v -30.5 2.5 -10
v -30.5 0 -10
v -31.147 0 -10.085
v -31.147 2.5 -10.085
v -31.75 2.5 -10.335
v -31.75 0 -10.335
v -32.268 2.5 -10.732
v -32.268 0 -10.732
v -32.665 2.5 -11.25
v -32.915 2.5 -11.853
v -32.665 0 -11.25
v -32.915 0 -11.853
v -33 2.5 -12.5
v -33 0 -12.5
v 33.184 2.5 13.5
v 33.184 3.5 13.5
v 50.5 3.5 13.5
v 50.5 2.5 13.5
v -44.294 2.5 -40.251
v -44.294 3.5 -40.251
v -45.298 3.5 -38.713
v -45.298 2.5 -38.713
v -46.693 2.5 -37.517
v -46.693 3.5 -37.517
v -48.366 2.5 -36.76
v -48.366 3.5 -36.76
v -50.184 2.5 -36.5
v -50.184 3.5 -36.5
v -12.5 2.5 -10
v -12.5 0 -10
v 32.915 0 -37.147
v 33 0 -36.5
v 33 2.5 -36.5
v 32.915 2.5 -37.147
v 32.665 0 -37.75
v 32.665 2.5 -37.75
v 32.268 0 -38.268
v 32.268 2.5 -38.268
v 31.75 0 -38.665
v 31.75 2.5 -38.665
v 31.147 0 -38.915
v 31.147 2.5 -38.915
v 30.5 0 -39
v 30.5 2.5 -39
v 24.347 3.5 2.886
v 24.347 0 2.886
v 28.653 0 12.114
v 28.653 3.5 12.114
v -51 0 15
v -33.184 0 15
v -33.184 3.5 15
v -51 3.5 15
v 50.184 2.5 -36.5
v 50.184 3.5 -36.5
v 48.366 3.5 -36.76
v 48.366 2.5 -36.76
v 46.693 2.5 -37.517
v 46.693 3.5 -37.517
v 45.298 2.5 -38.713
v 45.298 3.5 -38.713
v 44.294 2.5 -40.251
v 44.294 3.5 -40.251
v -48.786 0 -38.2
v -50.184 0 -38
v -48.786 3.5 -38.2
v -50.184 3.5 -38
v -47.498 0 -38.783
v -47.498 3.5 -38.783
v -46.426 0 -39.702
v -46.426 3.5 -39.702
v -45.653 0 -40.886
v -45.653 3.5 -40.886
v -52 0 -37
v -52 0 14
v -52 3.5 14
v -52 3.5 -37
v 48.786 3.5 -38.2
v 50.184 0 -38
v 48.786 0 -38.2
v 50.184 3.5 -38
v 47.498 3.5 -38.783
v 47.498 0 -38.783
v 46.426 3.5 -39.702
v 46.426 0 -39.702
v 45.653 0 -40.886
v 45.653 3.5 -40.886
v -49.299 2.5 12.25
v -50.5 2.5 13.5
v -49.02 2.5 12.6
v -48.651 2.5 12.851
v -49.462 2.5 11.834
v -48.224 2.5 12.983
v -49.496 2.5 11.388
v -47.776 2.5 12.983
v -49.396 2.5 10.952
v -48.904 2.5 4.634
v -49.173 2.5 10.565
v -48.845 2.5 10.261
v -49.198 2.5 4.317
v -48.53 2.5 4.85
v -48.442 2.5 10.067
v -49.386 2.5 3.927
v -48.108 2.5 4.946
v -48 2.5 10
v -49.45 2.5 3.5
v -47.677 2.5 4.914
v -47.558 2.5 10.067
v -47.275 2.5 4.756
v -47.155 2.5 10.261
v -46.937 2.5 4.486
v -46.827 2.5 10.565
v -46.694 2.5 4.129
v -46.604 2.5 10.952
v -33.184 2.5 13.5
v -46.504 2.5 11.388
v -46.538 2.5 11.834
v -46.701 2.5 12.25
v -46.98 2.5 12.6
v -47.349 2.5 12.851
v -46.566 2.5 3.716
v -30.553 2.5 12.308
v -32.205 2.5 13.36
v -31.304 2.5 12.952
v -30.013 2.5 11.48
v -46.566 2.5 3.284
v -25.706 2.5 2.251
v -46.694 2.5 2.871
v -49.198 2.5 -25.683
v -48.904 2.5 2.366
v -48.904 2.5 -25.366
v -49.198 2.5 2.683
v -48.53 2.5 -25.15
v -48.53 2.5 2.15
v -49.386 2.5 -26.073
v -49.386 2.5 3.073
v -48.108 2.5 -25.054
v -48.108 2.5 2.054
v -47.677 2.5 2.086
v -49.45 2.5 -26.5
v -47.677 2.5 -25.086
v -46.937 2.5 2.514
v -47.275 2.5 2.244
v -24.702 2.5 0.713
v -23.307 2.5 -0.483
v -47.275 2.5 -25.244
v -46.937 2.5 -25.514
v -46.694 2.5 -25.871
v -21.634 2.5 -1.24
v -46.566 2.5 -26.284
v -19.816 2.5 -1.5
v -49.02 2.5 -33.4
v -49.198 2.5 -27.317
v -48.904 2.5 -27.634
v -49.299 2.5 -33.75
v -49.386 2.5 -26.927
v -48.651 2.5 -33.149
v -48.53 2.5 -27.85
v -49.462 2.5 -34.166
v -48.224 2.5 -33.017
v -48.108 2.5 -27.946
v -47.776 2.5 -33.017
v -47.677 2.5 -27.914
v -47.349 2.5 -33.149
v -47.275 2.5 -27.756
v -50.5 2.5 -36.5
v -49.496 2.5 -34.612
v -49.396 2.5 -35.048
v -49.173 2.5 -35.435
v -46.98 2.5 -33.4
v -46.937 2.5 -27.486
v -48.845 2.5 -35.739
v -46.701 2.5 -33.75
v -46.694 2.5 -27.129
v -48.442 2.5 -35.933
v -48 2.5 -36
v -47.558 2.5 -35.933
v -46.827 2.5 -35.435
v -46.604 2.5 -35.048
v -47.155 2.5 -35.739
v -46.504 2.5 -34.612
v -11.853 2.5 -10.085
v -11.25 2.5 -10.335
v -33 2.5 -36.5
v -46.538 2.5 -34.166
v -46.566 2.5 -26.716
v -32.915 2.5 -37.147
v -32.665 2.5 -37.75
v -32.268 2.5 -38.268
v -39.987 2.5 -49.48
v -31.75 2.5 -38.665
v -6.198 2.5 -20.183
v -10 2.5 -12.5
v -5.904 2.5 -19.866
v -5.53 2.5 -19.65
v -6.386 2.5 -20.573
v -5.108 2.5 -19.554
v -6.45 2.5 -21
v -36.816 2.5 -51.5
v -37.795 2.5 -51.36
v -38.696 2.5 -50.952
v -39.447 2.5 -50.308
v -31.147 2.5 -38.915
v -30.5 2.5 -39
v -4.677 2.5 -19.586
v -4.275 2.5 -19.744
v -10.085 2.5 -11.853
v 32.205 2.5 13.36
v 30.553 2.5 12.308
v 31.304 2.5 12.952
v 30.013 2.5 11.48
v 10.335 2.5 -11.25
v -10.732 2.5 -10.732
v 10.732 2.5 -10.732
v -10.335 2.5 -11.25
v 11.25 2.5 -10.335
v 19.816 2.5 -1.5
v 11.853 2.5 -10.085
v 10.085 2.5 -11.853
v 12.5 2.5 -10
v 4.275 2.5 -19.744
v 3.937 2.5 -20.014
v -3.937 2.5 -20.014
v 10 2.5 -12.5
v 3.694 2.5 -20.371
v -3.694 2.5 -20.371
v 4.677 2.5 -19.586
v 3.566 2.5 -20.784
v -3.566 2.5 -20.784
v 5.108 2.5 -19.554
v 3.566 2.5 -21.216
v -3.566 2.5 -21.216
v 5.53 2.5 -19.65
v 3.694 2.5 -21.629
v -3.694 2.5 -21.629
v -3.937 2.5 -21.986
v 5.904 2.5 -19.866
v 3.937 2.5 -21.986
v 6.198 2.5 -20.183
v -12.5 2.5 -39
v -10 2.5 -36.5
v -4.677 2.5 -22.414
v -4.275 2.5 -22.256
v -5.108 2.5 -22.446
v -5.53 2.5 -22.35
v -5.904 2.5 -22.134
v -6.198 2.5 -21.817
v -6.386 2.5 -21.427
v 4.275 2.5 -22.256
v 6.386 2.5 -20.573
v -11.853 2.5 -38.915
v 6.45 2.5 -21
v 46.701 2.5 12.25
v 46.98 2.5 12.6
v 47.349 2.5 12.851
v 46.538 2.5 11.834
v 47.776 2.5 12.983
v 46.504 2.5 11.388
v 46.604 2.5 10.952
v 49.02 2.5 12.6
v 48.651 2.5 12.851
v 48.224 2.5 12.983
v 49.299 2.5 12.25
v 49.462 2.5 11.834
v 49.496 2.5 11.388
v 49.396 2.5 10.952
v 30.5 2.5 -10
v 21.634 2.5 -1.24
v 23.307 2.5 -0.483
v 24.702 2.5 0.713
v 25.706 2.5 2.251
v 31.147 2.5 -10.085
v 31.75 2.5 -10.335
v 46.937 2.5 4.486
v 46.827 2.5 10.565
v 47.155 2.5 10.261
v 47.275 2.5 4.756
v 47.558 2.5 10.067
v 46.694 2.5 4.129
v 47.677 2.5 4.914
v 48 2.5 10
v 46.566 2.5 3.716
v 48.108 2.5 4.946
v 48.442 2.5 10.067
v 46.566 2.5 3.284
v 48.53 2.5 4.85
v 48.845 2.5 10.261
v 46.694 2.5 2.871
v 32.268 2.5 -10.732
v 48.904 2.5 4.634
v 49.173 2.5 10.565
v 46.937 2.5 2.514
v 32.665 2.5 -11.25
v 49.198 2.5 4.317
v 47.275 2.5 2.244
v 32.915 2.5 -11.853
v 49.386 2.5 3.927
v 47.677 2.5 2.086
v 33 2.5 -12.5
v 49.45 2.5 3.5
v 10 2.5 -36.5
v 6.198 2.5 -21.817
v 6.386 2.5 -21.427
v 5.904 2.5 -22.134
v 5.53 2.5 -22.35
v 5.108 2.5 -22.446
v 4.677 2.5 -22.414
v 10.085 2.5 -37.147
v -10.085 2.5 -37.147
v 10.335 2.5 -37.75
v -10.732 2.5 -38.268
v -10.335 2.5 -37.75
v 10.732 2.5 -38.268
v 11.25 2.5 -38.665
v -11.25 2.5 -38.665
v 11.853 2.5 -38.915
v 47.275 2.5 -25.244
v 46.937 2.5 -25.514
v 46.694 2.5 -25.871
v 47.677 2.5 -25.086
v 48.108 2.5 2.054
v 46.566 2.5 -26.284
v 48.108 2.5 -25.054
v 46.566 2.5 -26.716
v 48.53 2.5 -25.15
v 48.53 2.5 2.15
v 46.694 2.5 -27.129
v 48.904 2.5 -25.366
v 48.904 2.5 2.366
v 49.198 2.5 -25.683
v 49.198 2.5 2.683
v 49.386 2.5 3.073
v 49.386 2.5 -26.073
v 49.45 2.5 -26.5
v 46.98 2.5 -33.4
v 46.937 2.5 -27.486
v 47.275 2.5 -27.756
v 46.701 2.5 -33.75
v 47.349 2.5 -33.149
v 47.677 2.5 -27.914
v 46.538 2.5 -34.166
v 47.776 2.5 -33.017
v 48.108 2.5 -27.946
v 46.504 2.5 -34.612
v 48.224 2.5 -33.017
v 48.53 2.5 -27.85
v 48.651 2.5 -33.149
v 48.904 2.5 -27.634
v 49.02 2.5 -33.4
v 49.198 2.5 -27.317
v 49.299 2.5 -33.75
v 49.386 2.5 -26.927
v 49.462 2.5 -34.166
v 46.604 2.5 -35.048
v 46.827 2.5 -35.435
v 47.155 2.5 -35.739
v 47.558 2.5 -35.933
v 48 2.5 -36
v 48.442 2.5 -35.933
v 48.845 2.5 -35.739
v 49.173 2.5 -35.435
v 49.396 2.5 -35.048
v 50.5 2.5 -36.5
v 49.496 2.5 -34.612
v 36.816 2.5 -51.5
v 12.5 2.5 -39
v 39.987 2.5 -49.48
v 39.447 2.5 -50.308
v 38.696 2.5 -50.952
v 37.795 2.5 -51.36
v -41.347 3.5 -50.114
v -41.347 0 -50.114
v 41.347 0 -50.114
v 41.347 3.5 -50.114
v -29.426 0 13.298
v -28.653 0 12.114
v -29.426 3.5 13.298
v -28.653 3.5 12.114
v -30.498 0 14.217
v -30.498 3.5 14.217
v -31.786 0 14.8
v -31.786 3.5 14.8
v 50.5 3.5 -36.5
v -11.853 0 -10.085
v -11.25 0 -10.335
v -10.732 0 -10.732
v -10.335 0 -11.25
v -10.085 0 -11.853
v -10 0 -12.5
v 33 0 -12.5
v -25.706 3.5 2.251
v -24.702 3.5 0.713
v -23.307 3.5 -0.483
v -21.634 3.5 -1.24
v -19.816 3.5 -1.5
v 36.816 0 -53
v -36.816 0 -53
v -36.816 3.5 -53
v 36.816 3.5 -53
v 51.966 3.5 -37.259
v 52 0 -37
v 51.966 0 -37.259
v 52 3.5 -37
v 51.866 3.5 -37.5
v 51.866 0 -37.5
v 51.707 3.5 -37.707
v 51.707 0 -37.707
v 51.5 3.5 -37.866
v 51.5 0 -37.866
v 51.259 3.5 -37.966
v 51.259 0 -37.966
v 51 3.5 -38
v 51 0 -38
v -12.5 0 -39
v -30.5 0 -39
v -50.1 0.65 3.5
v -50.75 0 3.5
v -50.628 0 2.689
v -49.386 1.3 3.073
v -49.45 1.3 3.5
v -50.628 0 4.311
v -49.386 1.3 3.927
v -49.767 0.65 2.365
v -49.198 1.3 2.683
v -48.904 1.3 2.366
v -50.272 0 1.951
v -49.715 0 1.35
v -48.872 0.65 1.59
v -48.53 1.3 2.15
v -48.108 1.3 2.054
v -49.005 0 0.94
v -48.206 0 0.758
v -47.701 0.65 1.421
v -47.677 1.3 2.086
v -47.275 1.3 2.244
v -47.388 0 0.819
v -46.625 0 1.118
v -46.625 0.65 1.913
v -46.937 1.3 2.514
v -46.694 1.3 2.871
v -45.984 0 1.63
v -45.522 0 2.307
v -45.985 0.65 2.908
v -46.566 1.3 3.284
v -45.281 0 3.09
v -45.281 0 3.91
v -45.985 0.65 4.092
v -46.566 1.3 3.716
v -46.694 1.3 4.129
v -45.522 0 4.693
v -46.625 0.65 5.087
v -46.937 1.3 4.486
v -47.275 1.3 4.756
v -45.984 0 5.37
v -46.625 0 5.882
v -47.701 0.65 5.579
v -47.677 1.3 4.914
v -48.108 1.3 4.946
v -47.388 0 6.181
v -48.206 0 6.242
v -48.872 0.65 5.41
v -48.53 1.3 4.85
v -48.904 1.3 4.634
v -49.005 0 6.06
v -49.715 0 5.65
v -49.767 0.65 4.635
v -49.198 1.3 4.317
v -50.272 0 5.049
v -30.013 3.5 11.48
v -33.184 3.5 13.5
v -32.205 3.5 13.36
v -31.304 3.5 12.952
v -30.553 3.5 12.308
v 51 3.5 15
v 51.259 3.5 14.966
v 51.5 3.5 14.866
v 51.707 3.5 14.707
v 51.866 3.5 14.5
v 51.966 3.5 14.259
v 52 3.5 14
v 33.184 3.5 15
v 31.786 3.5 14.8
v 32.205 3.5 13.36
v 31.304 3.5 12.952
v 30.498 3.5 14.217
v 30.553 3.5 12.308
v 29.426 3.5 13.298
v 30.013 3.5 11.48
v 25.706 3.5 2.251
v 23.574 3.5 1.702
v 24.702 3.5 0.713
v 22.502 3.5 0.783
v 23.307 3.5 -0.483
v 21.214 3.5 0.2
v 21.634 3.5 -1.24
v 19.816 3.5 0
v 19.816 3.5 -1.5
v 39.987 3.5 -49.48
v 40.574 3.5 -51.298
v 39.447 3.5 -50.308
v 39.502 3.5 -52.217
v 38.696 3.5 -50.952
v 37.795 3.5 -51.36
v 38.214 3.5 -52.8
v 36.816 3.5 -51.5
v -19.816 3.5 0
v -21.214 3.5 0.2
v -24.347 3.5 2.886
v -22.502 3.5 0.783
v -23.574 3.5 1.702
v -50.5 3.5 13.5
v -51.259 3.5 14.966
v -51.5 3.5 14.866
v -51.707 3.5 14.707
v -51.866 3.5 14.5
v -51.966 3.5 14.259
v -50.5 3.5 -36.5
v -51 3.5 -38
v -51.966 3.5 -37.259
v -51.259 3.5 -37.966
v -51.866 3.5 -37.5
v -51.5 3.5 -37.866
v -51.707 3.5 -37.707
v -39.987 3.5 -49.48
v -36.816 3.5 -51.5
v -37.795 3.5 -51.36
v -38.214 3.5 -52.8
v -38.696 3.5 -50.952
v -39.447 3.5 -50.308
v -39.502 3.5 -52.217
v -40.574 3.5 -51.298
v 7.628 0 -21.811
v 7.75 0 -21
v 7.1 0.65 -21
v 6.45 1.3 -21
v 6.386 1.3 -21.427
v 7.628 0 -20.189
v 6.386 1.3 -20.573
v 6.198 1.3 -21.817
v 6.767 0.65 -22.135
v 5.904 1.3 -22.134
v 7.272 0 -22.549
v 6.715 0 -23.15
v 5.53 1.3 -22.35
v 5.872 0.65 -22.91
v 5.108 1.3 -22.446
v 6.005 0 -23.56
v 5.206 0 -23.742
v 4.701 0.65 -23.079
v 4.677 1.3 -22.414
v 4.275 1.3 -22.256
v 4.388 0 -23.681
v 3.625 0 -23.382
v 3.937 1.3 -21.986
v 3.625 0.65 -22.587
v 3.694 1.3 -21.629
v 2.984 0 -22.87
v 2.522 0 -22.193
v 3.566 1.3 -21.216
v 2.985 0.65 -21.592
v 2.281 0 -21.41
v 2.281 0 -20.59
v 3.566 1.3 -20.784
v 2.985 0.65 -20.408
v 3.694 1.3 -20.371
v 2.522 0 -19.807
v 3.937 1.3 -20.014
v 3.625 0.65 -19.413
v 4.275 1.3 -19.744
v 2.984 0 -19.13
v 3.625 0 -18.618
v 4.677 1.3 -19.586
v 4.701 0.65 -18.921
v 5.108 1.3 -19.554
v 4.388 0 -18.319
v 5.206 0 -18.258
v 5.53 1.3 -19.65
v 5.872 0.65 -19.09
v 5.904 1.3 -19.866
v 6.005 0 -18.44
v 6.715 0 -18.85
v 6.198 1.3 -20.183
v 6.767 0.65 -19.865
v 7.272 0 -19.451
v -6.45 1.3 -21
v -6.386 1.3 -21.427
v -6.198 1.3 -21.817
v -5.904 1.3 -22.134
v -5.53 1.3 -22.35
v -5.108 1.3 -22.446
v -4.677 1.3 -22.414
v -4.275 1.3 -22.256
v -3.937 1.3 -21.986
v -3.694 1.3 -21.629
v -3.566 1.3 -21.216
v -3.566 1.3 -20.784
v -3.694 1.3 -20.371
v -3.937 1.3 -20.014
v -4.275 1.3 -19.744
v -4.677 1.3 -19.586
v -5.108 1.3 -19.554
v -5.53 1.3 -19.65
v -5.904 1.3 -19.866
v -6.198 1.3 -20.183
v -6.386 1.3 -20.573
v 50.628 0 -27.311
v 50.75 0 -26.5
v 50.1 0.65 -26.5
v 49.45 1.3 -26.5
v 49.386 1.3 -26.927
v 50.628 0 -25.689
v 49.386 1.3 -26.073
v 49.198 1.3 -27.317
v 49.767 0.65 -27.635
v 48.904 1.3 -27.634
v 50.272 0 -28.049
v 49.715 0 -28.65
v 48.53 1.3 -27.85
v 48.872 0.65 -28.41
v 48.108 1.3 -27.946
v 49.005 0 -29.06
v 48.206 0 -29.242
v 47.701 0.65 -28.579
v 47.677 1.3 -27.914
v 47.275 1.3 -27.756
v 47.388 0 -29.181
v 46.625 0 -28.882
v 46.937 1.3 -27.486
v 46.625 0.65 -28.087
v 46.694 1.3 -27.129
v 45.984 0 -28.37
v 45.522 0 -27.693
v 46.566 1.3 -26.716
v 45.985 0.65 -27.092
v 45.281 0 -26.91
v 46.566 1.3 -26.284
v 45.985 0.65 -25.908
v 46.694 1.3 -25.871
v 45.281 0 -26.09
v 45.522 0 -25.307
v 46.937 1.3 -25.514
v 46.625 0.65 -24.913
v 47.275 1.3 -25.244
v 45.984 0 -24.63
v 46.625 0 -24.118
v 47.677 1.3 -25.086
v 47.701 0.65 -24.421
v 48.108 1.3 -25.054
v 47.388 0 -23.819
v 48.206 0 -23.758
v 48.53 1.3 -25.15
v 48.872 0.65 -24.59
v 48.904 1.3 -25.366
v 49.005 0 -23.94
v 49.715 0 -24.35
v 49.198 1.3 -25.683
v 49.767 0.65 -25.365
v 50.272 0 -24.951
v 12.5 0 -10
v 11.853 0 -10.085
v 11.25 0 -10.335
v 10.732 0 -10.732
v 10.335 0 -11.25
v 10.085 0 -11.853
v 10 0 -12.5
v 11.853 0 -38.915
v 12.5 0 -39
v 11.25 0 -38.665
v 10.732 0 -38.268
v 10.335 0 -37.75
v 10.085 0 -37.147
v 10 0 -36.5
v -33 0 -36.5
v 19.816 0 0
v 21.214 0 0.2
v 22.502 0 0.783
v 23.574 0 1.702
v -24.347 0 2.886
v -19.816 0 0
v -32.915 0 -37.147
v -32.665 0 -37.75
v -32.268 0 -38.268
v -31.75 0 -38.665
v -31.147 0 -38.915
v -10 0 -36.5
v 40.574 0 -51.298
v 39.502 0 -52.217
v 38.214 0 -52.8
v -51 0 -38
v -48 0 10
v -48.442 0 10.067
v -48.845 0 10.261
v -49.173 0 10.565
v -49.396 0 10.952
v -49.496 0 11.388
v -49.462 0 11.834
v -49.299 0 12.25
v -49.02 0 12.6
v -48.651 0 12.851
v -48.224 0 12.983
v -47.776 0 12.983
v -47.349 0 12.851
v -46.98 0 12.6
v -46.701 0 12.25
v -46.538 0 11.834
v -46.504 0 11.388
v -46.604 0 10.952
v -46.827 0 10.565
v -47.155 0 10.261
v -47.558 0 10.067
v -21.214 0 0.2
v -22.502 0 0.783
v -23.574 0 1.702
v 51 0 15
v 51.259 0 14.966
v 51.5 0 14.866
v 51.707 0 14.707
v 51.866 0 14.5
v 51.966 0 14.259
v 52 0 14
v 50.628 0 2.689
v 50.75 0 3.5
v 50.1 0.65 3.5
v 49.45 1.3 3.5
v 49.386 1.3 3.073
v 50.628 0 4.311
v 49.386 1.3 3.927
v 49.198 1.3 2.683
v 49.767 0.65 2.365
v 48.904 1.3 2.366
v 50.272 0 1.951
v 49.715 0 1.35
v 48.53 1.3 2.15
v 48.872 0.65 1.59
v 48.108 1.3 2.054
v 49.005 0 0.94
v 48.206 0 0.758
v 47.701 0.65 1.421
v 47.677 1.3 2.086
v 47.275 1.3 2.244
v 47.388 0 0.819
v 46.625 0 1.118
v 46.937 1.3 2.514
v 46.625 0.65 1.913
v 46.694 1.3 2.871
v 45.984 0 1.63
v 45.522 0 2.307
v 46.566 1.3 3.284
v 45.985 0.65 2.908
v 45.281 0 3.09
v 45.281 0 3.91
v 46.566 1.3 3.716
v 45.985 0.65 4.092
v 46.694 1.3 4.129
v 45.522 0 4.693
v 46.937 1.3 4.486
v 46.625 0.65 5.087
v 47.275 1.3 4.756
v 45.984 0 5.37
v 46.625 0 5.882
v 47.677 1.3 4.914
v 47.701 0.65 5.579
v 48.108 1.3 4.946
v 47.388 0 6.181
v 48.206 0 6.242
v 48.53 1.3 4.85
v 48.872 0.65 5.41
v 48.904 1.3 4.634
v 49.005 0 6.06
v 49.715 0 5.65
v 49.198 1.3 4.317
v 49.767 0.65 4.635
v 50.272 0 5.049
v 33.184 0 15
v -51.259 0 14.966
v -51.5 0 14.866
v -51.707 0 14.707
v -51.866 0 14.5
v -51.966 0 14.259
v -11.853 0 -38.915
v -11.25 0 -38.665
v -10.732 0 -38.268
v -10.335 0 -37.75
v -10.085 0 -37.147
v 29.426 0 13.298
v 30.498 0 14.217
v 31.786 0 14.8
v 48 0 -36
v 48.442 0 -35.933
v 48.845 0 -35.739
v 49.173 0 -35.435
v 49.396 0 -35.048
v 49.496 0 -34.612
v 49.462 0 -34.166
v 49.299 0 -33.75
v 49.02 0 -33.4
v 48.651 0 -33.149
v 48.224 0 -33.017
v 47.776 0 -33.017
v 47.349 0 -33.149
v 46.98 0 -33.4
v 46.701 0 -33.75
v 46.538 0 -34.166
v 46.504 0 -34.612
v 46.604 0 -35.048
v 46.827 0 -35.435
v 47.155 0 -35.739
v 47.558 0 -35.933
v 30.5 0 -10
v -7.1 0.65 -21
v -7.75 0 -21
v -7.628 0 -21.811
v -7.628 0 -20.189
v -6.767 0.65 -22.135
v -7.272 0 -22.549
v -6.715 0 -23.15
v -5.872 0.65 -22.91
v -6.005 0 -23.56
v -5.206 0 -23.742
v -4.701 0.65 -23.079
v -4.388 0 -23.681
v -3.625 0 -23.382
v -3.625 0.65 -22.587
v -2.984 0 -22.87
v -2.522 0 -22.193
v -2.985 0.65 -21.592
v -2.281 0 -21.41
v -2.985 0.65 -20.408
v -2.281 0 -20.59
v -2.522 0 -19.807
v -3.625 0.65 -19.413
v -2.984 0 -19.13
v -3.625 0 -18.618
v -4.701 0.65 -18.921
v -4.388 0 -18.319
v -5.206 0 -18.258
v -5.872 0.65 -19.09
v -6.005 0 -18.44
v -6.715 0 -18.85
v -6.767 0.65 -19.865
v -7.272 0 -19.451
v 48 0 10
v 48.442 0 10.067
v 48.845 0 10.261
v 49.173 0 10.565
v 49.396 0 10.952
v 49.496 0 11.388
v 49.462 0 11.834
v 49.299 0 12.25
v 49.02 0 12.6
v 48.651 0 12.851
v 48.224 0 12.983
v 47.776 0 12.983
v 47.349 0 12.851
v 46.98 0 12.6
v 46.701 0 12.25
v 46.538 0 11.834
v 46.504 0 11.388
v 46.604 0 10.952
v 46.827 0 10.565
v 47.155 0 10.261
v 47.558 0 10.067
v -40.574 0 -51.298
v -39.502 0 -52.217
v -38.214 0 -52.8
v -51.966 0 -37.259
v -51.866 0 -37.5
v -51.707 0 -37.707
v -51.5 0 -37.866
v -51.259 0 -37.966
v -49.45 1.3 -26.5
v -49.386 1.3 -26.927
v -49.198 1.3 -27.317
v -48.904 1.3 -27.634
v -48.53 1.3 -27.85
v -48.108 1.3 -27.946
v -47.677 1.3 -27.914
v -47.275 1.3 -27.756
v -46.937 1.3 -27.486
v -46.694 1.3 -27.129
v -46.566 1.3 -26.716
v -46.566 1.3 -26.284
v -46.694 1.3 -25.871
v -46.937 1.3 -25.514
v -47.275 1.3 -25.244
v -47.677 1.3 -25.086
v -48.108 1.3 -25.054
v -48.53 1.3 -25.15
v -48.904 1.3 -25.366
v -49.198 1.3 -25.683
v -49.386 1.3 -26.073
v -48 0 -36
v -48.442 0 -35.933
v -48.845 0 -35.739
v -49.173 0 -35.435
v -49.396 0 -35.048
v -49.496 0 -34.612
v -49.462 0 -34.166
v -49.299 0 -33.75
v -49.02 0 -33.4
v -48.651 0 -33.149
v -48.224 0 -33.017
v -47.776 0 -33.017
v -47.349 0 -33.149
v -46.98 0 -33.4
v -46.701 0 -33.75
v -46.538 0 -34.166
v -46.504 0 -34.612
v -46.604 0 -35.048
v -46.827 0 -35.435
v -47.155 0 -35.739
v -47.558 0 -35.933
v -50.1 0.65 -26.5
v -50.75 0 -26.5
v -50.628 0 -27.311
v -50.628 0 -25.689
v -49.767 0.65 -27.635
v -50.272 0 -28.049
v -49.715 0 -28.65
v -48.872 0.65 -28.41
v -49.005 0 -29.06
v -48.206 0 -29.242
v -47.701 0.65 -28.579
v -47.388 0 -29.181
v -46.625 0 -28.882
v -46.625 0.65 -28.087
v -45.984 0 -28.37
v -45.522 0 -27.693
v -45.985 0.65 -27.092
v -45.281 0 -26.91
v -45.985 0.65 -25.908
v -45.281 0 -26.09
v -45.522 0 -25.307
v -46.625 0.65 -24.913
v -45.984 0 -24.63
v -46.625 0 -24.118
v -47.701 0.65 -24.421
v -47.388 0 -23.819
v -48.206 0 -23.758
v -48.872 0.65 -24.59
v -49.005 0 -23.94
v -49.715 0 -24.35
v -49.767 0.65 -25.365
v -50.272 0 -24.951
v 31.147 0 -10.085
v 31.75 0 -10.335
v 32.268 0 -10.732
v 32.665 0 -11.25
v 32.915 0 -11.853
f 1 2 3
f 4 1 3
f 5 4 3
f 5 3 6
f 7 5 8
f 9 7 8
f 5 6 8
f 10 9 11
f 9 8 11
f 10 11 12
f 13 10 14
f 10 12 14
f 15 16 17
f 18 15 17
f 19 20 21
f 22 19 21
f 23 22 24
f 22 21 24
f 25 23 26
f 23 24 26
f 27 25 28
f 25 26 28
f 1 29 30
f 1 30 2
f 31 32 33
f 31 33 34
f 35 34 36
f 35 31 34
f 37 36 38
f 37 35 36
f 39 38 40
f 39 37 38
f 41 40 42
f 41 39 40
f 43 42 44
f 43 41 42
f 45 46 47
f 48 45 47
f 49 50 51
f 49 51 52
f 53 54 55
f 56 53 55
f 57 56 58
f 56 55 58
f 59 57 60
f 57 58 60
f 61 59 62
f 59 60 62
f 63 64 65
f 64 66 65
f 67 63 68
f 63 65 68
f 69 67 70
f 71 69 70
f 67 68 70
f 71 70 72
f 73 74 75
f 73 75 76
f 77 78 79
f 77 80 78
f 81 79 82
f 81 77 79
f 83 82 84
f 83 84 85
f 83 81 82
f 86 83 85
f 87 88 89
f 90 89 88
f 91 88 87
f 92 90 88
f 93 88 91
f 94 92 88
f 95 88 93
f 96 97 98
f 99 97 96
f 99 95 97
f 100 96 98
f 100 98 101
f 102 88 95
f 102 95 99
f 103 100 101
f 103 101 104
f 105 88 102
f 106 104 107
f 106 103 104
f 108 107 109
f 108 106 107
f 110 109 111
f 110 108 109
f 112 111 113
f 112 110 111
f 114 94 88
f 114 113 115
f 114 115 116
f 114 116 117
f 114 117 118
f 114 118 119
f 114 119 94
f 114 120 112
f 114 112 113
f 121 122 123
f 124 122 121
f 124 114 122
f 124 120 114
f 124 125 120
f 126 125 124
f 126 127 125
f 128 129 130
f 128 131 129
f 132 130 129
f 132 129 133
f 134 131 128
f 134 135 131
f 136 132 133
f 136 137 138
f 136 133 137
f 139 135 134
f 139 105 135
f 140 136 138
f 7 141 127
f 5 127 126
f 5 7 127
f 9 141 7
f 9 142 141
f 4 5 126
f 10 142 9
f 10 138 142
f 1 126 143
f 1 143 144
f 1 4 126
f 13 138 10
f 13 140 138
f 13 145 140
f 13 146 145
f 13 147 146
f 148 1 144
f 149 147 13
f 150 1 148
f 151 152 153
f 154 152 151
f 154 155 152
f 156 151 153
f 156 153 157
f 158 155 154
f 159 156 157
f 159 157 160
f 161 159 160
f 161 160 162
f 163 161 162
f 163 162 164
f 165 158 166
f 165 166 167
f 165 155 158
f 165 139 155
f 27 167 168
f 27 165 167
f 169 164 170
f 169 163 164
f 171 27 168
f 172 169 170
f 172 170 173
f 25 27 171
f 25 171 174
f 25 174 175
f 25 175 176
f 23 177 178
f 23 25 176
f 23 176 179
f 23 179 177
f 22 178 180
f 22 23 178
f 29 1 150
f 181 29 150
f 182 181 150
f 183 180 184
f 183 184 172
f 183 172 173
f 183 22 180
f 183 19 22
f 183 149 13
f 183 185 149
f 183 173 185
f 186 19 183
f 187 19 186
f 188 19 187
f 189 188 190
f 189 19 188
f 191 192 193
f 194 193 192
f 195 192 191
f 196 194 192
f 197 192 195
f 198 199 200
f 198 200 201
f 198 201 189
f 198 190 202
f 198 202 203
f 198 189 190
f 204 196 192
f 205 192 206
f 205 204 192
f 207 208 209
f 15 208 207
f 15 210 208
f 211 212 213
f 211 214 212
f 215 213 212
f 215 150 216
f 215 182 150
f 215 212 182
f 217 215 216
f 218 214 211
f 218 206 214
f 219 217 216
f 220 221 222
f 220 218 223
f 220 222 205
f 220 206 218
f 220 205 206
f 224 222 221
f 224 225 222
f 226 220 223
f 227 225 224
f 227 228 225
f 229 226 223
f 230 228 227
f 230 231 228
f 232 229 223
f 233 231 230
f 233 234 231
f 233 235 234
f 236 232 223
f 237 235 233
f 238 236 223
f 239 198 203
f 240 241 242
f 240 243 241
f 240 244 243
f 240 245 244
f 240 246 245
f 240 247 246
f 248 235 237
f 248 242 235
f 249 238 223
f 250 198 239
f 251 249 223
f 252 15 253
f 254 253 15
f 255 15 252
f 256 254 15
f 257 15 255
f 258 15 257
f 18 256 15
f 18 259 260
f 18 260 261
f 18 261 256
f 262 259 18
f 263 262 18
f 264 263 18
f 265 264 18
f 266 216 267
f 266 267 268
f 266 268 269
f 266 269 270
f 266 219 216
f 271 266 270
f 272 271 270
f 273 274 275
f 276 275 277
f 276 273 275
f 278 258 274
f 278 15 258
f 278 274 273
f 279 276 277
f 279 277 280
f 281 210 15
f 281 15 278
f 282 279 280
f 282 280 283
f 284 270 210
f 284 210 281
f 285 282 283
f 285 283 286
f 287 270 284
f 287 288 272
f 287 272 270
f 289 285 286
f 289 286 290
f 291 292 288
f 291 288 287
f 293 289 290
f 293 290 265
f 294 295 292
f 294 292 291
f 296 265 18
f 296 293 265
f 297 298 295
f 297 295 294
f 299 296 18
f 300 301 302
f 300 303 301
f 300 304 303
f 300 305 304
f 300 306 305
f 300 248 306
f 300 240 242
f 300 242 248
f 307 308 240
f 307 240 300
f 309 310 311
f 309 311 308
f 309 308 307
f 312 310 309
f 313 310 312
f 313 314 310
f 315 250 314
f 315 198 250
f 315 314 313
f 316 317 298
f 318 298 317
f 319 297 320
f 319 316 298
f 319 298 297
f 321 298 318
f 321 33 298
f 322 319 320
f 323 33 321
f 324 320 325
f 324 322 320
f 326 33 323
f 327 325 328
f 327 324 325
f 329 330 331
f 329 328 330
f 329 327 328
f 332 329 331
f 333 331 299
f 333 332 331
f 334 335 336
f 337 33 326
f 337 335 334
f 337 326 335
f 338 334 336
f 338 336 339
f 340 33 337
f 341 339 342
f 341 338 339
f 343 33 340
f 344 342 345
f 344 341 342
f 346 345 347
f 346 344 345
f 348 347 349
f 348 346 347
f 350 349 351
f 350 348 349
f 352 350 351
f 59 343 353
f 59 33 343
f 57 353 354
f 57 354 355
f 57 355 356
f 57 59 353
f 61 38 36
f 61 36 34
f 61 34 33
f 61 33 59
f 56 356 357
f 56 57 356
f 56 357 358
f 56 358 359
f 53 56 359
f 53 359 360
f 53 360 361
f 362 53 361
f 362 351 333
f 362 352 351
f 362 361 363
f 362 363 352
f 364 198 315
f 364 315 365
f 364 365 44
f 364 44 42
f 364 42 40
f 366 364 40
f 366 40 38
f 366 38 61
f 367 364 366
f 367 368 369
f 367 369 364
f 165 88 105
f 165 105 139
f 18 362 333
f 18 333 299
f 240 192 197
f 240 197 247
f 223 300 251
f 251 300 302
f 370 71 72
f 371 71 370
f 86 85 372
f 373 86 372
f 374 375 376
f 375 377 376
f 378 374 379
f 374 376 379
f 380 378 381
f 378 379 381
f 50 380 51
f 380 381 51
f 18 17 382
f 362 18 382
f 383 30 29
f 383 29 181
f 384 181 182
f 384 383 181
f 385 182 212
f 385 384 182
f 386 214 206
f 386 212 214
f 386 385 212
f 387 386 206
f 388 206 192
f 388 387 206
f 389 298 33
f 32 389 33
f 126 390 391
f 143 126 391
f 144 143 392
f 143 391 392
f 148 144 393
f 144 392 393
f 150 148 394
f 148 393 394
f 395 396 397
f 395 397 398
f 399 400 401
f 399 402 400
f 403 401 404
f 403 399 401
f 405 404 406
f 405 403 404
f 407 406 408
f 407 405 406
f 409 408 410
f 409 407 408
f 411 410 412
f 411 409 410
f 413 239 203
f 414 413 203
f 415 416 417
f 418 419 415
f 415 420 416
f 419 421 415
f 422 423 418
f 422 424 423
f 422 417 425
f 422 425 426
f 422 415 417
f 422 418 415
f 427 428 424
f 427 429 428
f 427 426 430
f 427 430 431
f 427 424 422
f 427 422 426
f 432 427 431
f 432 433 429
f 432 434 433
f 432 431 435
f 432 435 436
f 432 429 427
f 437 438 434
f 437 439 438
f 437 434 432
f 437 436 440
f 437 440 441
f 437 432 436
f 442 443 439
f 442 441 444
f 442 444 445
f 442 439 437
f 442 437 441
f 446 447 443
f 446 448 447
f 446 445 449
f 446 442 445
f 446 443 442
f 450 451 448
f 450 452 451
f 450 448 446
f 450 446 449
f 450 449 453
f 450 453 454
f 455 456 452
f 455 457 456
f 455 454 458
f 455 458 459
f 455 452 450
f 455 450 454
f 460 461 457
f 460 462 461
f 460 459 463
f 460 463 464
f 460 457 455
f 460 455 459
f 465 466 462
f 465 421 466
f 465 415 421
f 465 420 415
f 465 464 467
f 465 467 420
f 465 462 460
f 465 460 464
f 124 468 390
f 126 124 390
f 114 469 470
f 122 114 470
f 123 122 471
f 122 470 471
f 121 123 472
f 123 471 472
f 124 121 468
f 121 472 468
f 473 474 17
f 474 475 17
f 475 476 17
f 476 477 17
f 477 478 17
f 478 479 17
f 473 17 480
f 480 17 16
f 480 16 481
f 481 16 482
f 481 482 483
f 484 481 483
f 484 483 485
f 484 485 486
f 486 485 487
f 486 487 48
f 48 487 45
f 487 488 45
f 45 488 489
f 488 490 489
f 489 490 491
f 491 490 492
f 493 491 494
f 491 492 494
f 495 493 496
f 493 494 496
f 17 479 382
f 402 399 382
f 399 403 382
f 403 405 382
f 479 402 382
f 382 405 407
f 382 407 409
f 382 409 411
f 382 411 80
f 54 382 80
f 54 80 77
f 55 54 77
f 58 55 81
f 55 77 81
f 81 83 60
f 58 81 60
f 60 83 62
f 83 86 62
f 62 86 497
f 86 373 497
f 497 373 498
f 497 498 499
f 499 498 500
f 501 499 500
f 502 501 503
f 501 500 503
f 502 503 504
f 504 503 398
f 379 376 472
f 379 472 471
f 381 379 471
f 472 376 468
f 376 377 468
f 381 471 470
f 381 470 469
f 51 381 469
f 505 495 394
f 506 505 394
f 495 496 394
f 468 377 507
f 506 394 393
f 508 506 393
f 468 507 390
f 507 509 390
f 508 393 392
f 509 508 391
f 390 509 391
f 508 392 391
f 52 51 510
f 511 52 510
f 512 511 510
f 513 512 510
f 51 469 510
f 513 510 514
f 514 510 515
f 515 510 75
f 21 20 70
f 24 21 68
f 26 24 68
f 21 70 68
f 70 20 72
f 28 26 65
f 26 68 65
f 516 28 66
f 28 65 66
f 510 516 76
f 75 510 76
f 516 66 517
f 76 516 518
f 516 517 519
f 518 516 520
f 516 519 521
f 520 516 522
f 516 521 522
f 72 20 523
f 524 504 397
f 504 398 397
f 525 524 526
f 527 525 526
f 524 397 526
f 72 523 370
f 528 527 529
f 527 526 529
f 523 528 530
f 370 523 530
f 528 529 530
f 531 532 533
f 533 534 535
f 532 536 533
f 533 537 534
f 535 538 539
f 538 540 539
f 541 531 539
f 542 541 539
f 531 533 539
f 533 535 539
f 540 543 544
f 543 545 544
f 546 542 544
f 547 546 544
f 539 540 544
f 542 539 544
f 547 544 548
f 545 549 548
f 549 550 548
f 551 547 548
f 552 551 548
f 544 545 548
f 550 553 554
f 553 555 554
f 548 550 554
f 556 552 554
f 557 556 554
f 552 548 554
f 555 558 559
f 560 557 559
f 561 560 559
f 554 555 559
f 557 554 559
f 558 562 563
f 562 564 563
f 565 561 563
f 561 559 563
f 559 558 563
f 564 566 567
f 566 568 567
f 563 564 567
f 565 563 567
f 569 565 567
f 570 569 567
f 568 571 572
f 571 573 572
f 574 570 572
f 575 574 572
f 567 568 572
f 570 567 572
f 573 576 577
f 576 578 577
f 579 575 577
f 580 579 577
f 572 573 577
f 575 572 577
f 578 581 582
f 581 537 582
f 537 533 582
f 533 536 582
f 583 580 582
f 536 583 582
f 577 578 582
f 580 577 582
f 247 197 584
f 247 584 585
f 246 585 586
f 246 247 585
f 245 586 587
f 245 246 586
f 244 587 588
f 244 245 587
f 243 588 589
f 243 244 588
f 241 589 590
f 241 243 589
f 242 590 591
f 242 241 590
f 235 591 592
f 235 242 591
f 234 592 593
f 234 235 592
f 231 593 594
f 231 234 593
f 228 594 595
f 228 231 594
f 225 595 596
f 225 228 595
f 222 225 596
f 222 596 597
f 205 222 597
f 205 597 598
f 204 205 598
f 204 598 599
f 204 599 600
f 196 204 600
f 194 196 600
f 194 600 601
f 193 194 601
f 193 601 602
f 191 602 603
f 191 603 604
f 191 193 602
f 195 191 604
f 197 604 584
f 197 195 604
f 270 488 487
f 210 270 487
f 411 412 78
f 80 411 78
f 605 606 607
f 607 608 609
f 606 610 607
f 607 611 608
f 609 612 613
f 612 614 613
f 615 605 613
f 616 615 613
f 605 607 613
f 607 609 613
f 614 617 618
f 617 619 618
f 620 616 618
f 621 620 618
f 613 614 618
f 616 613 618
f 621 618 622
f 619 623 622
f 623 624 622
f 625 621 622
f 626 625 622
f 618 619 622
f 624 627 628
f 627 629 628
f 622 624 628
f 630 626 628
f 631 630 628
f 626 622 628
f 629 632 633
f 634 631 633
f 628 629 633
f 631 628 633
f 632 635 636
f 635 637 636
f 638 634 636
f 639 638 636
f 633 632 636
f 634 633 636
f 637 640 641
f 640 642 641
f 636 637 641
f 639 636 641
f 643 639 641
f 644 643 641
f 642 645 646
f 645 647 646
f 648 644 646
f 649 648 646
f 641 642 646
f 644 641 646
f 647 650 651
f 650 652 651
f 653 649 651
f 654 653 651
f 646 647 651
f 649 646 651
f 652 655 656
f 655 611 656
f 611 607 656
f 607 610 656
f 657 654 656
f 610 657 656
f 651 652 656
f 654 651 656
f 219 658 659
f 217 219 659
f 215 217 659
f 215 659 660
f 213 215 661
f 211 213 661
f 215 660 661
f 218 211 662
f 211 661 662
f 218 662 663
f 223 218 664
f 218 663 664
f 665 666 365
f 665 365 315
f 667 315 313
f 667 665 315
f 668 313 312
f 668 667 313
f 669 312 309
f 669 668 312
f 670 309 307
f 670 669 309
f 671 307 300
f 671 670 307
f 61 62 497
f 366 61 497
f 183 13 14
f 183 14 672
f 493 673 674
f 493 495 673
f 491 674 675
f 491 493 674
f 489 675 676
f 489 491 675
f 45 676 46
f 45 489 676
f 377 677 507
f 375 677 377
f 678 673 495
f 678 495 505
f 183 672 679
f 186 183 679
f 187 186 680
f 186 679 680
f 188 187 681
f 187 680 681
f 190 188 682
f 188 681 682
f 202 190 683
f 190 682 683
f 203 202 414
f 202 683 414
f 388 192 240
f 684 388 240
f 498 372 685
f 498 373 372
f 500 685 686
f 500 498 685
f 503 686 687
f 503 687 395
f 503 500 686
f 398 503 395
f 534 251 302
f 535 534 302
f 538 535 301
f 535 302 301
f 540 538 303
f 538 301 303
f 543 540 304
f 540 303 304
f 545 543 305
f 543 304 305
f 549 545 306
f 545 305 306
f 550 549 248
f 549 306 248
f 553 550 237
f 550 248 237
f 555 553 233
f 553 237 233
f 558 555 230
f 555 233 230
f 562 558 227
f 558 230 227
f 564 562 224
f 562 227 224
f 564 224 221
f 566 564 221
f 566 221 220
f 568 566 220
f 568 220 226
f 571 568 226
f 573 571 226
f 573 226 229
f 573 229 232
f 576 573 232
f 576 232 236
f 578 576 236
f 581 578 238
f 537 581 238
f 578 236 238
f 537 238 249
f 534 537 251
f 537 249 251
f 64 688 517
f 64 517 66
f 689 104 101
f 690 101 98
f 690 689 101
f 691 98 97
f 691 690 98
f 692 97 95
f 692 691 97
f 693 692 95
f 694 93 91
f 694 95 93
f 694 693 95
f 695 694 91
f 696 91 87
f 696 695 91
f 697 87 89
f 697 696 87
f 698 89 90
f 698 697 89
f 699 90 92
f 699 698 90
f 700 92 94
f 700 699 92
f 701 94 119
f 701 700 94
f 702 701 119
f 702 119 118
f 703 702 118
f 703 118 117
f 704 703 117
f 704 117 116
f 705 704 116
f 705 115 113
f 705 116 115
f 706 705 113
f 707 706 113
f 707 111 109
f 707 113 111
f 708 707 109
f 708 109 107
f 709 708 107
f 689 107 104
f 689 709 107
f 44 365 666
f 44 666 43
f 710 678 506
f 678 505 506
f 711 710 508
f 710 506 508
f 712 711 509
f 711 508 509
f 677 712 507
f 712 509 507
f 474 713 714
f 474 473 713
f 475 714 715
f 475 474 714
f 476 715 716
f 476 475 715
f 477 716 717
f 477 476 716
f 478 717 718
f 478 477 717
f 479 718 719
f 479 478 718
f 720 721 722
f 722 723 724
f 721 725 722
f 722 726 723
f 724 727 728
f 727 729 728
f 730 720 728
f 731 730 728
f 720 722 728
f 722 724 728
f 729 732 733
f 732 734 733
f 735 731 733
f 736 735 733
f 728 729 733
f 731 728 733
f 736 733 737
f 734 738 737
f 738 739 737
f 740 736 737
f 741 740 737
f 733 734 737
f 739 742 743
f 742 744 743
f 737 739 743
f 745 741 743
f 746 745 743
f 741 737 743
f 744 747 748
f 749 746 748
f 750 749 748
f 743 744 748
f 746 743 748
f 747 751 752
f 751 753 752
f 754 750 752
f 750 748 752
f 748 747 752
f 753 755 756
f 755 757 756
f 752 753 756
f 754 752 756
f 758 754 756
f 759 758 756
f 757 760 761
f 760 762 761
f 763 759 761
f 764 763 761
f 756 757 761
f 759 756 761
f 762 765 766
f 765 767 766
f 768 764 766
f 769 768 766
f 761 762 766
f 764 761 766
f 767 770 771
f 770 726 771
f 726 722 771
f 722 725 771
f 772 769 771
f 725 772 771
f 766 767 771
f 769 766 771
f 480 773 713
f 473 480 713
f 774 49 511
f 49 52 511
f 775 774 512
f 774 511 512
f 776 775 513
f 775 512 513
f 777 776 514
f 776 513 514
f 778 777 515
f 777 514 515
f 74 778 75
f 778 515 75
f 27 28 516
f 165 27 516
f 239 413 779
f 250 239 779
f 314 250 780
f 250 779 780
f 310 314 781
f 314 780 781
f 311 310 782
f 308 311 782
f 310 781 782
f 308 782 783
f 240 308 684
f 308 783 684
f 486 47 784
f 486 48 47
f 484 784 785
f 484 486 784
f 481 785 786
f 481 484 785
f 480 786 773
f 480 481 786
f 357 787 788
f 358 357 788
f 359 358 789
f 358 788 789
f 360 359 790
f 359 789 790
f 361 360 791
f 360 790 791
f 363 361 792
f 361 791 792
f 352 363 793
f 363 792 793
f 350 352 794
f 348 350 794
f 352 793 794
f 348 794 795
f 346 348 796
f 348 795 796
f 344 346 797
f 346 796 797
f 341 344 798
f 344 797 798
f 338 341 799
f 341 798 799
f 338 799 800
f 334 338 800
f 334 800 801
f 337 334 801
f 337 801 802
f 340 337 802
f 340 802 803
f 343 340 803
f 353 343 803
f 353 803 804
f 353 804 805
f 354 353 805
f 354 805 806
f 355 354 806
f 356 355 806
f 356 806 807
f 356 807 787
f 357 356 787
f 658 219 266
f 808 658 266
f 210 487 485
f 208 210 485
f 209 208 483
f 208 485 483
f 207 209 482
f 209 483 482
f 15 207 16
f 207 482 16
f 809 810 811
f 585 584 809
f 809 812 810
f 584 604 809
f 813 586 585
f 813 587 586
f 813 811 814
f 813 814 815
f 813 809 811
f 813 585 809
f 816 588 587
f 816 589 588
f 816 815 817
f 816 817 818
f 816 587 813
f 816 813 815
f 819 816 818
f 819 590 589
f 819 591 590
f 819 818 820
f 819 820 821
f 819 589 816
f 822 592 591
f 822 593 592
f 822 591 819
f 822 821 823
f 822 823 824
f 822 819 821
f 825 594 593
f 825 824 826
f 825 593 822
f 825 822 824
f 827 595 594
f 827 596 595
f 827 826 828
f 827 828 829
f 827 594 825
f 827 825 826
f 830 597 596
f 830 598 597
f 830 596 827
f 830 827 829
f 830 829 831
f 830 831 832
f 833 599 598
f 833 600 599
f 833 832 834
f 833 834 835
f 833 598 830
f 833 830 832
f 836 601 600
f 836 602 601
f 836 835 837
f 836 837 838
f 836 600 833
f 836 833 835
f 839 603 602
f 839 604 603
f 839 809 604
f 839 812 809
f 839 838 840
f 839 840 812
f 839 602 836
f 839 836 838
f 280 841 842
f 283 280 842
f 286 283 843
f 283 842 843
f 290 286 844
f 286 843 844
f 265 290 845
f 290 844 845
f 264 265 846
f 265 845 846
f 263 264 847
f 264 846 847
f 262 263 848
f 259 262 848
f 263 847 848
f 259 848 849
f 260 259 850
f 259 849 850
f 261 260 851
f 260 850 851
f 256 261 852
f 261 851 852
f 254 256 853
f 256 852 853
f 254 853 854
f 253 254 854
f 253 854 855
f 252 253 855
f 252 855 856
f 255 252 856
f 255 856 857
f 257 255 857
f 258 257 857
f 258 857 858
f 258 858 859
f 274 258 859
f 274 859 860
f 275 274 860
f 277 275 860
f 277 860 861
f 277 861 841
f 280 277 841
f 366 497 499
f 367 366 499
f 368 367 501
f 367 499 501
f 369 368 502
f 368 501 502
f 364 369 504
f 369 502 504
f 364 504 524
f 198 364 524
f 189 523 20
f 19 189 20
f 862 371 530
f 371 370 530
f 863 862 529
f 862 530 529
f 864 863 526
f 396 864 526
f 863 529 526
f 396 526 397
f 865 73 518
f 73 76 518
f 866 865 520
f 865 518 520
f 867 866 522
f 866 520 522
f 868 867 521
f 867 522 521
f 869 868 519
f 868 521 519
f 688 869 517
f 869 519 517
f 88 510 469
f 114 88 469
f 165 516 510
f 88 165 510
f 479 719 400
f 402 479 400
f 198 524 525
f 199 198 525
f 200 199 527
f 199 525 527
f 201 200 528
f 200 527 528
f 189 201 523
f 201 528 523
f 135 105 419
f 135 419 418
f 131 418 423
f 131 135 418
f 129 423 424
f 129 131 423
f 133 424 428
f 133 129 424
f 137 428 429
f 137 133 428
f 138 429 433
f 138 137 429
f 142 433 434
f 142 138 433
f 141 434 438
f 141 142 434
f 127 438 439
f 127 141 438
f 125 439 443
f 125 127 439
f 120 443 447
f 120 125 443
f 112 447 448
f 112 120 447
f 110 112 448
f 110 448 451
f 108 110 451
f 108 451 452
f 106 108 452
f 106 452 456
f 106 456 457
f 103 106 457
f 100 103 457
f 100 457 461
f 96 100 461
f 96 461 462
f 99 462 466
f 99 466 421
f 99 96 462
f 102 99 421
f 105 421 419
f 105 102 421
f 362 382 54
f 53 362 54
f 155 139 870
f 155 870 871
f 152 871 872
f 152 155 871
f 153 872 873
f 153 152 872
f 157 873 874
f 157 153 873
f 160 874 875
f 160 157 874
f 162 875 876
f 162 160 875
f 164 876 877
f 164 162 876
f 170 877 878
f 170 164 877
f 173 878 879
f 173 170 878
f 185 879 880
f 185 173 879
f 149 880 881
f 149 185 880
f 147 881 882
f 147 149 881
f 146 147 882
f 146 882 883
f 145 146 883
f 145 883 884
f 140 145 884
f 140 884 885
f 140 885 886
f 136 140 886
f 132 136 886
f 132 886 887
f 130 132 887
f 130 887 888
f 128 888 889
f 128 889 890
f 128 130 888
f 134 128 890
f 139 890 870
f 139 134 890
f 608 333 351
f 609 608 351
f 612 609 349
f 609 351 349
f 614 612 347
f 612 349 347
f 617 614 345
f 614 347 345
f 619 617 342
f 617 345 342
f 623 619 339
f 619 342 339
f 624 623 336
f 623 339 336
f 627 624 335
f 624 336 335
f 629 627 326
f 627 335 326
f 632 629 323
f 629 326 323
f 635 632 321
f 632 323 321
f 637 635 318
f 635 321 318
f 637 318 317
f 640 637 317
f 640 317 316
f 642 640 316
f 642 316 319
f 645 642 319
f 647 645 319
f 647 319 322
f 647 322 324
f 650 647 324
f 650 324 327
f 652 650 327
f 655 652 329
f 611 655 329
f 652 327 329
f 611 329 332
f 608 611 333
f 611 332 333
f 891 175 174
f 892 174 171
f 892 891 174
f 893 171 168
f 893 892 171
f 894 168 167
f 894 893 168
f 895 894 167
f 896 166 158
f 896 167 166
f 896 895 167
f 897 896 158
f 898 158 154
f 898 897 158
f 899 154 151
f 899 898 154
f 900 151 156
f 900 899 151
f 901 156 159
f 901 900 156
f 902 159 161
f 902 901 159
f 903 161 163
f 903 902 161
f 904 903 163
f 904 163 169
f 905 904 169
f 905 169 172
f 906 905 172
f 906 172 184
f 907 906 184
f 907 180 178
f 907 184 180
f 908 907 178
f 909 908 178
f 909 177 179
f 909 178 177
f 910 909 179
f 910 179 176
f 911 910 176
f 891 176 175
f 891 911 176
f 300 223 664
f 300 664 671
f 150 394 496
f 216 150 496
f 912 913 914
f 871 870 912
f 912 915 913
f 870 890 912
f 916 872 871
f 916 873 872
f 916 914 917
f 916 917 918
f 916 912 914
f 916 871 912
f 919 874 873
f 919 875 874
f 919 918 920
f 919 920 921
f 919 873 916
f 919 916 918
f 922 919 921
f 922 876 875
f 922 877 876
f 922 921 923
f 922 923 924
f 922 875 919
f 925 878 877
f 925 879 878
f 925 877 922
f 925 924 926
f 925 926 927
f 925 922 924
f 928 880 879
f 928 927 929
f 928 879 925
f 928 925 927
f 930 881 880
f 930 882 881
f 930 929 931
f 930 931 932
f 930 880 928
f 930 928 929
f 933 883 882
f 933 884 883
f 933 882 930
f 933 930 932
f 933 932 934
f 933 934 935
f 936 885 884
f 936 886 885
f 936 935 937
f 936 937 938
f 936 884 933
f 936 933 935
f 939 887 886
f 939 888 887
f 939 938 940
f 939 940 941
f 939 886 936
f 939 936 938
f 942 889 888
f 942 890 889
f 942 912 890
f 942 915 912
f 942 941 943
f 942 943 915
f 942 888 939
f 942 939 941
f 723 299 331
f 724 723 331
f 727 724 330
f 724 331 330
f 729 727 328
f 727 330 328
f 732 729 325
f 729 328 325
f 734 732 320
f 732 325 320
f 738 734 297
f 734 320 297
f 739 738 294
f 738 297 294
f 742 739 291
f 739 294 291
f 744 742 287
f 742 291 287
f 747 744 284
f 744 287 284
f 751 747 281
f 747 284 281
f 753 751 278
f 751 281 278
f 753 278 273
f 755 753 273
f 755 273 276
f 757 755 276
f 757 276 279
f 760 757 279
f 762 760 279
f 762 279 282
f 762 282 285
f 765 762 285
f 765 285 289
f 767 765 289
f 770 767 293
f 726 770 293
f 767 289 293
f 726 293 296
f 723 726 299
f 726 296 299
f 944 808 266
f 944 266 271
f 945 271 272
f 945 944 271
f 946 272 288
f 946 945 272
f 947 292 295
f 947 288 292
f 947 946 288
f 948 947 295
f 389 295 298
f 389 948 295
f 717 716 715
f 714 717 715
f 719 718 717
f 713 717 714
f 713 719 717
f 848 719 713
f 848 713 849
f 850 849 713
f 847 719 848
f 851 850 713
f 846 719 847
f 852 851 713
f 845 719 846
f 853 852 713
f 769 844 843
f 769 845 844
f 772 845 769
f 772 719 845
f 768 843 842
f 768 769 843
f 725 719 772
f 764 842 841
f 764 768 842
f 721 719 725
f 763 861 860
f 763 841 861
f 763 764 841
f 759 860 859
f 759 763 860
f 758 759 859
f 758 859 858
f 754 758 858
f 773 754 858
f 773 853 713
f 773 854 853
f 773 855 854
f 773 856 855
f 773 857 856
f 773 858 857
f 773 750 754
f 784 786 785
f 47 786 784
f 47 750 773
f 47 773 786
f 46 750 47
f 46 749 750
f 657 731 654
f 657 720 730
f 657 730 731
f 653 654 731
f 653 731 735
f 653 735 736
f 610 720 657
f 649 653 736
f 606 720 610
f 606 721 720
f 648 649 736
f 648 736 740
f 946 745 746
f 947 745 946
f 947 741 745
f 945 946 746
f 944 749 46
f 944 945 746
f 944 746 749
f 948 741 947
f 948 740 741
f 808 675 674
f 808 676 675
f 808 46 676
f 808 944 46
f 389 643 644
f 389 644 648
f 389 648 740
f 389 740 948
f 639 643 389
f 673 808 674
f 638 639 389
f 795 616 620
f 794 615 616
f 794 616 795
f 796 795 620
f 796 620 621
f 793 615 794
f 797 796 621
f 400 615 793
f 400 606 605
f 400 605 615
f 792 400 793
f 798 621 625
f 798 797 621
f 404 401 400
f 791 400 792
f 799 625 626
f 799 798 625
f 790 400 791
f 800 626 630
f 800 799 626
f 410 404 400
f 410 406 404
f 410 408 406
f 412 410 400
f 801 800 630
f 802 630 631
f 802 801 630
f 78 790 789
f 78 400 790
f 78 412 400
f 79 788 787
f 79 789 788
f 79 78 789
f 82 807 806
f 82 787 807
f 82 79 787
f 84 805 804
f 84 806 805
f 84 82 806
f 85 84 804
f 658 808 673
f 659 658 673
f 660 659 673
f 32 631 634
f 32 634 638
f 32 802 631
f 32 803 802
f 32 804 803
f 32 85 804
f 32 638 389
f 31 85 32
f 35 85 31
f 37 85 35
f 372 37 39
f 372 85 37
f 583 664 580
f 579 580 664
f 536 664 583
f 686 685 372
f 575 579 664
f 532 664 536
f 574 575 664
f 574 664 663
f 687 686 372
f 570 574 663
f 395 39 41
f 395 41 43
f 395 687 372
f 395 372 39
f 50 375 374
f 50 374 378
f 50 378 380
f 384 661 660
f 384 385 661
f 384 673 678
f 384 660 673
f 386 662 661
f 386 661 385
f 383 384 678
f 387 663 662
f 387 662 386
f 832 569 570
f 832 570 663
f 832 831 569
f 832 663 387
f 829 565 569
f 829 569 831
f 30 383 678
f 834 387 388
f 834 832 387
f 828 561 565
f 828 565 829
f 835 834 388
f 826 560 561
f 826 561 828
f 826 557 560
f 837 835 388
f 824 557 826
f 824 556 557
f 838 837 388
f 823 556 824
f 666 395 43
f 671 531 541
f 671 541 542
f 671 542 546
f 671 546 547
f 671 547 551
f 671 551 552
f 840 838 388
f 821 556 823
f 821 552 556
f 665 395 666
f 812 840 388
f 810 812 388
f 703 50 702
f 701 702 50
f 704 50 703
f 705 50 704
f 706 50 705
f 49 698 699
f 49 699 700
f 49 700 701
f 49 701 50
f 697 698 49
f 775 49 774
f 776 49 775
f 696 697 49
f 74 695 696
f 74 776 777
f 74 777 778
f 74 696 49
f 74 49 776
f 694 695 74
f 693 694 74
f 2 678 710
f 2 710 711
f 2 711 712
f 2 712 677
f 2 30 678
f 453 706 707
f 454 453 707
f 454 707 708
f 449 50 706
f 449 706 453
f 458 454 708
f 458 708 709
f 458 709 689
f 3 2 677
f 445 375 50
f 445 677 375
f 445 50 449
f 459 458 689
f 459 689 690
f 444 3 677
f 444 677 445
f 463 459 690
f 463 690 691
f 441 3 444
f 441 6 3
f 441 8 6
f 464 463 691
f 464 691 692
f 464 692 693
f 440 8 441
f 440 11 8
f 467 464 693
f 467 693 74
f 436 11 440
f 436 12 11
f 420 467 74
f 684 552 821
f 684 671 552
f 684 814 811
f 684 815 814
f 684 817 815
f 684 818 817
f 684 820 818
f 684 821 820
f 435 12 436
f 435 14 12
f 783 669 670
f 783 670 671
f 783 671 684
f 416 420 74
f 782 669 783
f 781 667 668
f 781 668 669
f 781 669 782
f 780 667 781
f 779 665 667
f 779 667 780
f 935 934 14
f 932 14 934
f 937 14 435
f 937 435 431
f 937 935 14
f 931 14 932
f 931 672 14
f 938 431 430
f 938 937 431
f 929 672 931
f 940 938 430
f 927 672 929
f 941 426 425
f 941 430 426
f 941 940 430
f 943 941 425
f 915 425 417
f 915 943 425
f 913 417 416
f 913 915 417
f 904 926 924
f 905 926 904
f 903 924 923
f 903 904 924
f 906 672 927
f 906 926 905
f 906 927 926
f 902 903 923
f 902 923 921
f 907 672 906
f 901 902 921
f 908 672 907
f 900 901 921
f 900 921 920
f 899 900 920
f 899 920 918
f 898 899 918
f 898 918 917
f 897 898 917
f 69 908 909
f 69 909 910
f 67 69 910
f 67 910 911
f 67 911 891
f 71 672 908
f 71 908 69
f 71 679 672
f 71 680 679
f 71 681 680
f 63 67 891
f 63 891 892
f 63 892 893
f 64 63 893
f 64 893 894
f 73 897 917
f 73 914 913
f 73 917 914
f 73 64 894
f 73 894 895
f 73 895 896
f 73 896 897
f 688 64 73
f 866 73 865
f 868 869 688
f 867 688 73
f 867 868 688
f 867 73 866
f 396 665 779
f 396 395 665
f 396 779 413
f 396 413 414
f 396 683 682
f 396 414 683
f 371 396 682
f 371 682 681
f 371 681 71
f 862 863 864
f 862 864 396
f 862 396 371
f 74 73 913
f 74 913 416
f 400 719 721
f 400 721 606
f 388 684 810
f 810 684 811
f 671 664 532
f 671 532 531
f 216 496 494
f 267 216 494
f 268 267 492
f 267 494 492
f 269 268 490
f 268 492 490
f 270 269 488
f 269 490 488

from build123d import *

# Parameters (mm, degrees)
BOSS_EXTRUDE1_DEPTH                               = 3.5
FILLET1_R                                         = 5
FILLET2_R                                         = 1
CSK_FOR_M2_5_FLAT_HEAD_MACHINE_SCREW1_D           = 2.9
CSK_FOR_M2_5_FLAT_HEAD_MACHINE_SCREW1_CSINK_D     = 5.5
CSK_FOR_M2_5_FLAT_HEAD_MACHINE_SCREW1_CSINK_ANGLE = 90
SKETCH6_R                                         = 1.5
CUT_EXTRUDE3_DEPTH                                = 75.3320254
SKETCH7_W                                         = 23
SKETCH7_H                                         = 29
CUT_EXTRUDE4_DEPTH                                = 75.3320254
FILLET3_R                                         = 2.5
FILLET1_OF_MIRROR1_R                              = 5
FILLET2_OF_MIRROR1_R                              = 1
FILLET3_OF_MIRROR1_R                              = 2.5
CUT_EXTRUDE2_DEPTH                                = 1


with BuildPart() as part:
    # Sketch1 → Boss-Extrude1 (new body)
    with BuildSketch(Plane(origin=(0, 0, 0), x_dir=(1, 0, 0), z_dir=(0, 1, 0))):
        Polygon((0, 0), (23, 0), (30, -15), (52, -15), (52, 38), (47, 38), (40, 53), (0, 53), align=None)
    boss_extrude1 = extrude(amount=BOSS_EXTRUDE1_DEPTH)

    # Fillet1
    fillet1_edges = [part.edges().sort_by_distance(p)[0] for p in [
        (47, 1.75, -38),
        (40, 1.75, -53),
        (30, 1.75, 15),
        (23, 1.75, 0),
    ]]
    fillet(fillet1_edges, radius=FILLET1_R)

    # Fillet2
    fillet2_edges = [part.edges().sort_by_distance(p)[0] for p in [
        (52, 1.75, 15),
        (52, 1.75, -38),
    ]]
    fillet(fillet2_edges, radius=FILLET2_R)

    # CSK for M2.5 Flat Head Machine Screw1 (through all)
    with Locations(Plane(origin=(0, 0, 0), x_dir=(-1, 0, 0), z_dir=(0, -1, 0))):
        with Locations((-5, 21), (-48, -3.5), (-48, 26.5)):
            csk_for_m2_5_flat_head_machine_screw1 = CounterSinkHole(CSK_FOR_M2_5_FLAT_HEAD_MACHINE_SCREW1_D / 2, CSK_FOR_M2_5_FLAT_HEAD_MACHINE_SCREW1_CSINK_D / 2, counter_sink_angle=CSK_FOR_M2_5_FLAT_HEAD_MACHINE_SCREW1_CSINK_ANGLE)

    # Sketch6 → Cut-Extrude3 (cut, through all)
    with BuildSketch(Plane.XZ):
        with Locations((48, 11.5)):
            Circle(SKETCH6_R)
        with Locations((48, -34.5)):
            Circle(SKETCH6_R)
    cut_extrude3 = extrude(amount=-CUT_EXTRUDE3_DEPTH, mode=Mode.SUBTRACT)

    # Sketch7 → Cut-Extrude4 (cut, through all)
    with BuildSketch(Plane(origin=(0, 3.5, 0), x_dir=(1, 0, 0), z_dir=(0, 1, 0))):
        with Locations((21.5, 24.5)):
            Rectangle(SKETCH7_W, SKETCH7_H)
    cut_extrude4 = extrude(amount=-CUT_EXTRUDE4_DEPTH, mode=Mode.SUBTRACT)

    # Fillet3
    fillet3_edges = [part.edges().sort_by_distance(p)[0] for p in [
        (33, 1.75, -39),
        (33, 1.75, -10),
        (10, 1.75, -10),
        (10, 1.75, -39),
    ]]
    fillet(fillet3_edges, radius=FILLET3_R)

    # Mirror1: Boss-Extrude1, CSK for M2.5 Flat Head Machine Screw1, Cut-Extrude3, Cut-Extrude4 across plane
    add(boss_extrude1.mirror(Plane(origin=(0, 0, 0), x_dir=(0, 0, 1), z_dir=(1, 0, 0))))
    add(csk_for_m2_5_flat_head_machine_screw1.mirror(Plane(origin=(0, 0, 0), x_dir=(0, 0, 1), z_dir=(1, 0, 0))), mode=Mode.SUBTRACT)
    add(cut_extrude3.mirror(Plane(origin=(0, 0, 0), x_dir=(0, 0, 1), z_dir=(1, 0, 0))), mode=Mode.SUBTRACT)
    add(cut_extrude4.mirror(Plane(origin=(0, 0, 0), x_dir=(0, 0, 1), z_dir=(1, 0, 0))), mode=Mode.SUBTRACT)

    # Fillet1 of Mirror1
    fillet1_of_mirror1_edges = [part.edges().sort_by_distance(p)[0] for p in [
        (-47, 1.75, -38),
        (-40, 1.75, -53),
        (-30, 1.75, 15),
        (-23, 1.75, 0),
    ]]
    fillet(fillet1_of_mirror1_edges, radius=FILLET1_OF_MIRROR1_R)

    # Fillet2 of Mirror1
    fillet2_of_mirror1_edges = [part.edges().sort_by_distance(p)[0] for p in [
        (-52, 1.75, 15),
        (-52, 1.75, -38),
    ]]
    fillet(fillet2_of_mirror1_edges, radius=FILLET2_OF_MIRROR1_R)

    # Fillet3 of Mirror1
    fillet3_of_mirror1_edges = [part.edges().sort_by_distance(p)[0] for p in [
        (-33, 1.75, -39),
        (-33, 1.75, -10),
        (-10, 1.75, -10),
        (-10, 1.75, -39),
    ]]
    fillet(fillet3_of_mirror1_edges, radius=FILLET3_OF_MIRROR1_R)

    # Sketch2 → Cut-Extrude2 (cut)
    with BuildSketch(Plane(origin=(0, 3.5, 0), x_dir=(1, 0, 0), z_dir=(0, 1, 0))):
        with BuildLine():
            Line((-50.5, 36.5), (-50.5, -13.5))
            Line((-50.5, -13.5), (-33.184315119, -13.5))
            ThreePointArc((-33.184315119, -13.5), (-31.304201685, -12.952147265), (-30.012674129, -11.480099129))
            Line((-30.012674129, -11.480099129), (-25.705875291, -2.251244475))
            ThreePointArc((-25.705875291, -2.251244475), (-23.307324116, 0.482559207), (-19.815684881, 1.5))
            Line((-19.815684881, 1.5), (19.815684881, 1.5))
            ThreePointArc((19.815684881, 1.5), (23.307324116, 0.482559207), (25.705875291, -2.251244475))
            Line((25.705875291, -2.251244475), (30.012674129, -11.480099129))
            ThreePointArc((30.012674129, -11.480099129), (31.304201685, -12.952147265), (33.184315119, -13.5))
            Line((33.184315119, -13.5), (50.5, -13.5))
            Line((50.5, -13.5), (50.5, 36.5))
            Line((50.5, 36.5), (50.184315119, 36.5))
            ThreePointArc((50.184315119, 36.5), (46.692675884, 37.517440793), (44.294124709, 40.251244475))
            Line((44.294124709, 40.251244475), (39.987325871, 49.480099129))
            ThreePointArc((39.987325871, 49.480099129), (38.695798315, 50.952147265), (36.815684881, 51.5))
            Line((36.815684881, 51.5), (-36.815684881, 51.5))
            ThreePointArc((-36.815684881, 51.5), (-38.695798315, 50.952147265), (-39.987325871, 49.480099129))
            Line((-39.987325871, 49.480099129), (-44.294124709, 40.251244475))
            ThreePointArc((-44.294124709, 40.251244475), (-46.692675884, 37.517440793), (-50.184315119, 36.5))
            Line((-50.184315119, 36.5), (-50.5, 36.5))
        make_face()
    extrude(amount=-CUT_EXTRUDE2_DEPTH, mode=Mode.SUBTRACT)


solid = part.part
